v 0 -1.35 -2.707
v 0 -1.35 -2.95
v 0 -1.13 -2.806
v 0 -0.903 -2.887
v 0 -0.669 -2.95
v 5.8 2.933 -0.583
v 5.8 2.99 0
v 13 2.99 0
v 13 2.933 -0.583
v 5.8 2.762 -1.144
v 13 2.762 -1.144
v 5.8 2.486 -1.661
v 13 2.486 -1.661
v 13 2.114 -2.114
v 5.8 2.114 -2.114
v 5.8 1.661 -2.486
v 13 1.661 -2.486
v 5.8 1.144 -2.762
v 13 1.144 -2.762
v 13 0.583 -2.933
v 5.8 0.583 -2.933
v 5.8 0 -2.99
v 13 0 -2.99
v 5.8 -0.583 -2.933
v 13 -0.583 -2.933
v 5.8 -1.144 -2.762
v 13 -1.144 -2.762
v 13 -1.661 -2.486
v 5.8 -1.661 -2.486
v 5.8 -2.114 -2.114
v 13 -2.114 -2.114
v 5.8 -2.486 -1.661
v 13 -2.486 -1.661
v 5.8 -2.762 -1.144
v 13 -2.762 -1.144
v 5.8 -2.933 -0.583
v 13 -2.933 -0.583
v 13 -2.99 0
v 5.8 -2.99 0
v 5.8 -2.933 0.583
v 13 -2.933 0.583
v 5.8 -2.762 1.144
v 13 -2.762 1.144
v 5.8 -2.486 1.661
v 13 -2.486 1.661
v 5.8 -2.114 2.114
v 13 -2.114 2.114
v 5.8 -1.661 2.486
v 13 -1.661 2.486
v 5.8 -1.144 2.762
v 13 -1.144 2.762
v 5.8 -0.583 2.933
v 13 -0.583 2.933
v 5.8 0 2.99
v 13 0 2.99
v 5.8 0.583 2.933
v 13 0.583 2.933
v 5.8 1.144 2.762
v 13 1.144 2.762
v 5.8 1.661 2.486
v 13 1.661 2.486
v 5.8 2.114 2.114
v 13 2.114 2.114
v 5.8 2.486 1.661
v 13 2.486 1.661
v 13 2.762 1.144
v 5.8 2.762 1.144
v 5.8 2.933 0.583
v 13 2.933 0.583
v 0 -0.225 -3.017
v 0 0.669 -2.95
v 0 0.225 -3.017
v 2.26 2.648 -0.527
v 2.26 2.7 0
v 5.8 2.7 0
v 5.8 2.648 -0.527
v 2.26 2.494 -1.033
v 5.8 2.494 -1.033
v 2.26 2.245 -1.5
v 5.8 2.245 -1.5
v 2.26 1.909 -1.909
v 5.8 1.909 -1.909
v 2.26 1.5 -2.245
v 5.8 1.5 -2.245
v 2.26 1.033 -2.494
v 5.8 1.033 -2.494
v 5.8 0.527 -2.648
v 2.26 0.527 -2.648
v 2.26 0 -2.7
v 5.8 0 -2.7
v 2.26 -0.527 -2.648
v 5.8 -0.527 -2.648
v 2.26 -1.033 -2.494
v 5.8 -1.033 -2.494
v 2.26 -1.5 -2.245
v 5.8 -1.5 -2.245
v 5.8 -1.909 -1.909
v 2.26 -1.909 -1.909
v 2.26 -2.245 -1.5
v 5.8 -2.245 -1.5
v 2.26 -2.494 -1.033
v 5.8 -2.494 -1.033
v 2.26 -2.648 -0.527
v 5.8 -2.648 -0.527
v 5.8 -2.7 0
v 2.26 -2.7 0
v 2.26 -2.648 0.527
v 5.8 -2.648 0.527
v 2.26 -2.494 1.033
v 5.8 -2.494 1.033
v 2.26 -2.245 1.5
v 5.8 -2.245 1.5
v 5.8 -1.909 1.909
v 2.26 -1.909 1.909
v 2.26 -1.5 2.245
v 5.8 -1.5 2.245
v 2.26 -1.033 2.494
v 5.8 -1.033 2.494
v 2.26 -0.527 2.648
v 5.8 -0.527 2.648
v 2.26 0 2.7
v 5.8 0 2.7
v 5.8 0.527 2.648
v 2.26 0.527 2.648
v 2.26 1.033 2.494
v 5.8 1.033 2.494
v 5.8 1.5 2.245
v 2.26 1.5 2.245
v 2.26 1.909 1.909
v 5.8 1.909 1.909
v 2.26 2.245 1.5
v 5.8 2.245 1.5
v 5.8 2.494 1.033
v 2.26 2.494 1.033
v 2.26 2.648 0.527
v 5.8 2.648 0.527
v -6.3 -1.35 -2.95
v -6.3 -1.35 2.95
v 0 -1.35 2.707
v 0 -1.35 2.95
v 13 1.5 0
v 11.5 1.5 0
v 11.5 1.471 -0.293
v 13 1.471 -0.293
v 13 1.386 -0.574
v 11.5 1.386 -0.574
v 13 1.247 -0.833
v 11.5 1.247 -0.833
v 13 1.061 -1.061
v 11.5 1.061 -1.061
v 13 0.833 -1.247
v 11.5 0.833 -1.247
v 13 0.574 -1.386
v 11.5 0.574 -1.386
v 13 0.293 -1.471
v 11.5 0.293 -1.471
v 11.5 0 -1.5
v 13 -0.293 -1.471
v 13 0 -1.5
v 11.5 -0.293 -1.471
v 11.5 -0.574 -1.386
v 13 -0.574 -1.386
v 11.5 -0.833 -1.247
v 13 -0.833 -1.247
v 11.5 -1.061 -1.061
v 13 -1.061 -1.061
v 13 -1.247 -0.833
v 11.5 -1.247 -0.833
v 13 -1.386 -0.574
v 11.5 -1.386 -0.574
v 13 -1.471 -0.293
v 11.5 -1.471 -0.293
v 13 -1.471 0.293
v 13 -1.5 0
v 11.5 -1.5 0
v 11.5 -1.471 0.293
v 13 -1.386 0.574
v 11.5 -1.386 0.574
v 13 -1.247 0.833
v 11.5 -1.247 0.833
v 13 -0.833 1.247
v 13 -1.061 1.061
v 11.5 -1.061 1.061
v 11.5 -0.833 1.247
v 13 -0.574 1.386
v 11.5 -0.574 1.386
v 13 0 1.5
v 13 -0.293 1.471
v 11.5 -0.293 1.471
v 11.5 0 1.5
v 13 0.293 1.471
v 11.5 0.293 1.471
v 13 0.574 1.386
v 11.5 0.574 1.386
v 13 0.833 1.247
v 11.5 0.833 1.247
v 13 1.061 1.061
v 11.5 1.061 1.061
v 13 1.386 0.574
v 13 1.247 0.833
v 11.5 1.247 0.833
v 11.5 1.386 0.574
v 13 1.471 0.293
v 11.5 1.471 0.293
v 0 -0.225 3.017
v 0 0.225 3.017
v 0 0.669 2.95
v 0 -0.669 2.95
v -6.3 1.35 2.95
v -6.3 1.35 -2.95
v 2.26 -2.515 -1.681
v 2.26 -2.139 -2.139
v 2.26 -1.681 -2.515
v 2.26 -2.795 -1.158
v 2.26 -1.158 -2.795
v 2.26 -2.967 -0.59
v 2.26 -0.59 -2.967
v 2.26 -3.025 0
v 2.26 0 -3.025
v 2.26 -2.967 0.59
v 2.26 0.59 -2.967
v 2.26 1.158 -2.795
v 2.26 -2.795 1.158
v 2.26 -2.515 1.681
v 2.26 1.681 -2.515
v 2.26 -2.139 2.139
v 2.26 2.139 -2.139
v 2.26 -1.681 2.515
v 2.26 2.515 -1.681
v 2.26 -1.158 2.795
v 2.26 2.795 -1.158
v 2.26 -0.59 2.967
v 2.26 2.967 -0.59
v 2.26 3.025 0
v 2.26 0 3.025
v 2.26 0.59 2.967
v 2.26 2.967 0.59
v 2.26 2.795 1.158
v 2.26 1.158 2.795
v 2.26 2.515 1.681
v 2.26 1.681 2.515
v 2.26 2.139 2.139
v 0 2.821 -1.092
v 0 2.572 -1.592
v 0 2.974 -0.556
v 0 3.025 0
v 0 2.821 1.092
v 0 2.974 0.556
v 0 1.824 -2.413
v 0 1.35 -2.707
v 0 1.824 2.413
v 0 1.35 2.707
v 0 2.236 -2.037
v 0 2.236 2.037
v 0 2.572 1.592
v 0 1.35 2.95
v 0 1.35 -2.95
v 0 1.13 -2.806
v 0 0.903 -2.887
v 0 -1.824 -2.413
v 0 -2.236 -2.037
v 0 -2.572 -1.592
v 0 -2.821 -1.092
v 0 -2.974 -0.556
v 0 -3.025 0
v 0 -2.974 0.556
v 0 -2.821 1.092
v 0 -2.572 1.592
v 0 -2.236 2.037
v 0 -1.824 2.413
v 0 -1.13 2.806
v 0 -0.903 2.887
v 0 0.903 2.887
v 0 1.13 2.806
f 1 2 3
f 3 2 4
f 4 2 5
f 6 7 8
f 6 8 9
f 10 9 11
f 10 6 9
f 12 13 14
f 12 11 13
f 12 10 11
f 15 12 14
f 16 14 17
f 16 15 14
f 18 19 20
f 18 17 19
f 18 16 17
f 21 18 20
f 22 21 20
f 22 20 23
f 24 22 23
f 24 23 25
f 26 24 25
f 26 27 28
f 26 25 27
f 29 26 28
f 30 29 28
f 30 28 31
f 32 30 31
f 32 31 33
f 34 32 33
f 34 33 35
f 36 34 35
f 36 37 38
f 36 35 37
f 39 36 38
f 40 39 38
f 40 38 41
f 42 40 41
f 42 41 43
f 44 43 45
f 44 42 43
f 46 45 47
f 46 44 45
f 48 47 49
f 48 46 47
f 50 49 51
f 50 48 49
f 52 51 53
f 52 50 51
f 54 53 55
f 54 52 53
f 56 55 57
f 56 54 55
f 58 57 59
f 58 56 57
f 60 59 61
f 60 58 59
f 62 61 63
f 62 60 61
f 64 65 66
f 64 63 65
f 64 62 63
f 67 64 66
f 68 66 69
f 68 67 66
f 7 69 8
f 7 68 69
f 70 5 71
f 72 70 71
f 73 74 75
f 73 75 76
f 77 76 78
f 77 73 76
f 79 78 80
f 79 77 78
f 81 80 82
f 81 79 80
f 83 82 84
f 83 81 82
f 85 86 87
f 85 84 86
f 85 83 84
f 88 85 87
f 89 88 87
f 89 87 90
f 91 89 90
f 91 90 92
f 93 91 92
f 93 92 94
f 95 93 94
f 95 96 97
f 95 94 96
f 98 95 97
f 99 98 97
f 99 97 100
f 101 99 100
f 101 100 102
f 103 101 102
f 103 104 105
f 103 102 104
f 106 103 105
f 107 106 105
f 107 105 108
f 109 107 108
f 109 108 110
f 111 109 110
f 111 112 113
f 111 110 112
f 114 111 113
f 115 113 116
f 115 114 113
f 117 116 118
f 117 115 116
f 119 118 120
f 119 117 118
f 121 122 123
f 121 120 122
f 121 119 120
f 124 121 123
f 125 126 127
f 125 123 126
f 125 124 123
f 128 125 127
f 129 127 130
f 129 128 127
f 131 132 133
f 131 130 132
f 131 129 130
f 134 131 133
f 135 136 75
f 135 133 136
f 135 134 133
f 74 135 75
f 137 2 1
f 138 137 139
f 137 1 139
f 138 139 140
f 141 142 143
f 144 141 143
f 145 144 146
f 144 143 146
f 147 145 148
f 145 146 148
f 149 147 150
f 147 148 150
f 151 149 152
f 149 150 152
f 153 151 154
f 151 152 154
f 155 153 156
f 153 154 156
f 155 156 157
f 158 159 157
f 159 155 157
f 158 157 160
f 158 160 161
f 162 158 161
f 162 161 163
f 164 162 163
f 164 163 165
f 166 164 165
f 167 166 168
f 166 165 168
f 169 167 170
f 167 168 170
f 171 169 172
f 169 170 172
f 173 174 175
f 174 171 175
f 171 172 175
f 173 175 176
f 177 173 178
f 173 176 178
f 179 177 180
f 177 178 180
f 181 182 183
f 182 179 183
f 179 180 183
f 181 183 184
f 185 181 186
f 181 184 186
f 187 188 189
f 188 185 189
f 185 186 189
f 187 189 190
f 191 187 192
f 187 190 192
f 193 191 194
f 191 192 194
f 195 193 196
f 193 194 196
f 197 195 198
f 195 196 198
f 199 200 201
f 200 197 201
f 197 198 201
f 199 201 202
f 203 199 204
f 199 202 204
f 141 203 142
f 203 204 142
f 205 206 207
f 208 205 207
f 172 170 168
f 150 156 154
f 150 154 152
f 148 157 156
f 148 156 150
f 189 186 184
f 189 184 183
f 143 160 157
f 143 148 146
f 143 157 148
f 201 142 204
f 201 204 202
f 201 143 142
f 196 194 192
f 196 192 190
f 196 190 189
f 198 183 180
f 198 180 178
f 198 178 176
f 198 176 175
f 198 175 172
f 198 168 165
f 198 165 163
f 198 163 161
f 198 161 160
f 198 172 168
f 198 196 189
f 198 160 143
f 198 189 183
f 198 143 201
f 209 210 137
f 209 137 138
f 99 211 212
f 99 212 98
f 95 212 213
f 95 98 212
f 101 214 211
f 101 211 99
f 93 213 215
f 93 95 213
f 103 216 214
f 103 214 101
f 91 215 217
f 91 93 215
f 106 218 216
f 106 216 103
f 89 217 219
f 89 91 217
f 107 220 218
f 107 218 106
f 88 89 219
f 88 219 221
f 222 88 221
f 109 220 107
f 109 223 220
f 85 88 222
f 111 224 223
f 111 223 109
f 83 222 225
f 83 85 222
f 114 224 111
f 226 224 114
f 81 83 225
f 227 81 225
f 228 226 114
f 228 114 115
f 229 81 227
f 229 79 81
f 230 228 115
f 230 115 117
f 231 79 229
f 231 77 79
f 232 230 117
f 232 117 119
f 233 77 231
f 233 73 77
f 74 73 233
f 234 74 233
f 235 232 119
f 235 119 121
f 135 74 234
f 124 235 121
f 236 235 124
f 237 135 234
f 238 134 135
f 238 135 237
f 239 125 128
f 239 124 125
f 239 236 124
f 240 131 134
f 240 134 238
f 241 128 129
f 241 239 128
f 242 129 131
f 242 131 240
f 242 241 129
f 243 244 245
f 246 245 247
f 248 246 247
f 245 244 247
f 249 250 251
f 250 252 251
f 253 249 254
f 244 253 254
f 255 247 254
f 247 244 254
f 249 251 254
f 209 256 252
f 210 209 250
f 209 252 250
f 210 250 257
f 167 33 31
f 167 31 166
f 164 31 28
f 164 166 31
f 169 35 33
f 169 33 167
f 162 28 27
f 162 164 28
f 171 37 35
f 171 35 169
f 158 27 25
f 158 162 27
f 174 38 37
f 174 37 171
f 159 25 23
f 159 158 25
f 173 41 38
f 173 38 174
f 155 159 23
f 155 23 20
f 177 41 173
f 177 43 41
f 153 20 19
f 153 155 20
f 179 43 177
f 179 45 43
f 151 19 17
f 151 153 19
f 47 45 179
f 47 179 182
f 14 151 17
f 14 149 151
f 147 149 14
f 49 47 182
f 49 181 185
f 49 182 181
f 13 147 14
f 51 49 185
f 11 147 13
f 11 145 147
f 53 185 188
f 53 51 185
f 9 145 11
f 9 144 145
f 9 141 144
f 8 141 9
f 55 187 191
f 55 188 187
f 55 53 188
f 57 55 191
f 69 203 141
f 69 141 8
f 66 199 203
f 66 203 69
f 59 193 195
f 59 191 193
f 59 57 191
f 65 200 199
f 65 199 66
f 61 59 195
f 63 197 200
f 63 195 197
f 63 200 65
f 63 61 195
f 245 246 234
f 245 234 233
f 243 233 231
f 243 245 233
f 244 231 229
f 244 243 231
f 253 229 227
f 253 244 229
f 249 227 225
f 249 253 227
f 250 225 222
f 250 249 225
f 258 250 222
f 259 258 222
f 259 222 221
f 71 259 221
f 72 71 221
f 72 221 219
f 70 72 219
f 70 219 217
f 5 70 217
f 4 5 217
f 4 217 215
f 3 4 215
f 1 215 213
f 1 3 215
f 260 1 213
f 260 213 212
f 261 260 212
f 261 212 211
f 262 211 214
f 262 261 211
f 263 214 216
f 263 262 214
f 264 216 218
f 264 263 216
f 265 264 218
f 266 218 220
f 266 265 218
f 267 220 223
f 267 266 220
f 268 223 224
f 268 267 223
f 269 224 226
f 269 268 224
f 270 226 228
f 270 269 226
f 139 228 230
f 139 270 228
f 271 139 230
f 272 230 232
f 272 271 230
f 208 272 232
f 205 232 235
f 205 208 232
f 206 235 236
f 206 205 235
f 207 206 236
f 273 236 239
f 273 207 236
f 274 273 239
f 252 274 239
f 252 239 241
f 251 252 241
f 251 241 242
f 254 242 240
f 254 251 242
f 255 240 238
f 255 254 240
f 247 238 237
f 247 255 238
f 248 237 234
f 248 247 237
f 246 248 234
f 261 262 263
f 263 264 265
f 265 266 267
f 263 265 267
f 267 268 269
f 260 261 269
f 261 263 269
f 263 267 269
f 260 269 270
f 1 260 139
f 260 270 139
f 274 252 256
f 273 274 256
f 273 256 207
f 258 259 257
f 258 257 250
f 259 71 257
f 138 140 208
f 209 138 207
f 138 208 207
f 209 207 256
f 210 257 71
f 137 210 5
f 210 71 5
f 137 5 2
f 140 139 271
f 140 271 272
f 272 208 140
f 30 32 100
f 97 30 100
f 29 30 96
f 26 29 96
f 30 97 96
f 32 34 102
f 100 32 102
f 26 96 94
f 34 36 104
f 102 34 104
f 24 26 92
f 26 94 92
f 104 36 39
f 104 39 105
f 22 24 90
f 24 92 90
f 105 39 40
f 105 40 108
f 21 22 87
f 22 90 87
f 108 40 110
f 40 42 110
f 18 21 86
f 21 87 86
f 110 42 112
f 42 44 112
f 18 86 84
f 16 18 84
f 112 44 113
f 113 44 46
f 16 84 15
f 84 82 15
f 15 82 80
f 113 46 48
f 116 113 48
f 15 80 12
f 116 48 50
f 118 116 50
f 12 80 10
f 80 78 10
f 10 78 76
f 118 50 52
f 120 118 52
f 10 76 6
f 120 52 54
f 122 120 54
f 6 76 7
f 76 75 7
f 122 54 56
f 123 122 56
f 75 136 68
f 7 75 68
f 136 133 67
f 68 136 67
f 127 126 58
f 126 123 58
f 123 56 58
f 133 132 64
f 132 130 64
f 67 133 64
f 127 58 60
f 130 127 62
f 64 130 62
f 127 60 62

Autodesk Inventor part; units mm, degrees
ref_plane "YZ Plane" through (0, 0, 0) normal (1, 0, 0) x (0, 1, 0)
ref_plane "XZ Plane" through (0, 0, 0) normal (0, 1, 0) x (-1, 0, 0)
ref_plane "XY Plane" through (0, 0, 0) normal (0, 0, 1) x (1, 0, 0)
sketch "Sketch1" plane through (0, 0, 0) normal (0, 0, 1) x (1, 0, 0)
  line L0 (0, 0) -> (11.5, 0)
  line L1 (13, 1.5) -> (13, 2.99)
  line L2 (13, 2.99) -> (5.8, 2.99)
  line L3 (5.8, 2.99) -> (5.8, 2.7)
  line L4 (5.8, 2.7) -> (2.26, 2.7)
  line L5 (2.26, 2.7) -> (2.26, 3.025)
  line L6 (2.26, 3.025) -> (0, 3.025)
  line L7 (0, 3.025) -> (0, 0)
  line L8 (13, 1.5) -> (11.5, 1.5)
  line L9 (11.5, 1.5) -> (11.5, 0)
  dimension "d0" = 7.2
  dimension "d1" = 5.98
  dimension "d2" = 2.26
  dimension "d3" = 6.05
  dimension "d4" = 3
  dimension "d5" = 1.5
  dimension "d6" = 13
  dimension "d7" = 5.4
revolve "Revolution1" add sketch "Sketch1" angle 360 about axis through (0, 0, 0) along (1, 0, 0)
sketch "Sketch2" plane through (0, 0, 0) normal (-1, 0, 0) x (0, 0, 1)
  line L0 (-2.95, -1.35) -> (2.95, -1.35)
  line L1 (2.95, -1.35) -> (2.95, 1.35)
  line L2 (2.95, 1.35) -> (-2.95, 1.35)
  line L3 (-2.95, 1.35) -> (-2.95, -1.35)
  line L4 (-2.95, -1.35) -> (2.95, 1.35) construction
  line L5 (2.95, -1.35) -> (-2.95, 1.35) construction
  point P0 (0, 0)
  dimension "d9" = 5.9
  dimension "d10" = 2.7
extrude "Extrusion1" add sketch "Sketch2" along normal blind 6.3
properties part number "laser_taida_6mm" material "Brass, Soft Yellow"
